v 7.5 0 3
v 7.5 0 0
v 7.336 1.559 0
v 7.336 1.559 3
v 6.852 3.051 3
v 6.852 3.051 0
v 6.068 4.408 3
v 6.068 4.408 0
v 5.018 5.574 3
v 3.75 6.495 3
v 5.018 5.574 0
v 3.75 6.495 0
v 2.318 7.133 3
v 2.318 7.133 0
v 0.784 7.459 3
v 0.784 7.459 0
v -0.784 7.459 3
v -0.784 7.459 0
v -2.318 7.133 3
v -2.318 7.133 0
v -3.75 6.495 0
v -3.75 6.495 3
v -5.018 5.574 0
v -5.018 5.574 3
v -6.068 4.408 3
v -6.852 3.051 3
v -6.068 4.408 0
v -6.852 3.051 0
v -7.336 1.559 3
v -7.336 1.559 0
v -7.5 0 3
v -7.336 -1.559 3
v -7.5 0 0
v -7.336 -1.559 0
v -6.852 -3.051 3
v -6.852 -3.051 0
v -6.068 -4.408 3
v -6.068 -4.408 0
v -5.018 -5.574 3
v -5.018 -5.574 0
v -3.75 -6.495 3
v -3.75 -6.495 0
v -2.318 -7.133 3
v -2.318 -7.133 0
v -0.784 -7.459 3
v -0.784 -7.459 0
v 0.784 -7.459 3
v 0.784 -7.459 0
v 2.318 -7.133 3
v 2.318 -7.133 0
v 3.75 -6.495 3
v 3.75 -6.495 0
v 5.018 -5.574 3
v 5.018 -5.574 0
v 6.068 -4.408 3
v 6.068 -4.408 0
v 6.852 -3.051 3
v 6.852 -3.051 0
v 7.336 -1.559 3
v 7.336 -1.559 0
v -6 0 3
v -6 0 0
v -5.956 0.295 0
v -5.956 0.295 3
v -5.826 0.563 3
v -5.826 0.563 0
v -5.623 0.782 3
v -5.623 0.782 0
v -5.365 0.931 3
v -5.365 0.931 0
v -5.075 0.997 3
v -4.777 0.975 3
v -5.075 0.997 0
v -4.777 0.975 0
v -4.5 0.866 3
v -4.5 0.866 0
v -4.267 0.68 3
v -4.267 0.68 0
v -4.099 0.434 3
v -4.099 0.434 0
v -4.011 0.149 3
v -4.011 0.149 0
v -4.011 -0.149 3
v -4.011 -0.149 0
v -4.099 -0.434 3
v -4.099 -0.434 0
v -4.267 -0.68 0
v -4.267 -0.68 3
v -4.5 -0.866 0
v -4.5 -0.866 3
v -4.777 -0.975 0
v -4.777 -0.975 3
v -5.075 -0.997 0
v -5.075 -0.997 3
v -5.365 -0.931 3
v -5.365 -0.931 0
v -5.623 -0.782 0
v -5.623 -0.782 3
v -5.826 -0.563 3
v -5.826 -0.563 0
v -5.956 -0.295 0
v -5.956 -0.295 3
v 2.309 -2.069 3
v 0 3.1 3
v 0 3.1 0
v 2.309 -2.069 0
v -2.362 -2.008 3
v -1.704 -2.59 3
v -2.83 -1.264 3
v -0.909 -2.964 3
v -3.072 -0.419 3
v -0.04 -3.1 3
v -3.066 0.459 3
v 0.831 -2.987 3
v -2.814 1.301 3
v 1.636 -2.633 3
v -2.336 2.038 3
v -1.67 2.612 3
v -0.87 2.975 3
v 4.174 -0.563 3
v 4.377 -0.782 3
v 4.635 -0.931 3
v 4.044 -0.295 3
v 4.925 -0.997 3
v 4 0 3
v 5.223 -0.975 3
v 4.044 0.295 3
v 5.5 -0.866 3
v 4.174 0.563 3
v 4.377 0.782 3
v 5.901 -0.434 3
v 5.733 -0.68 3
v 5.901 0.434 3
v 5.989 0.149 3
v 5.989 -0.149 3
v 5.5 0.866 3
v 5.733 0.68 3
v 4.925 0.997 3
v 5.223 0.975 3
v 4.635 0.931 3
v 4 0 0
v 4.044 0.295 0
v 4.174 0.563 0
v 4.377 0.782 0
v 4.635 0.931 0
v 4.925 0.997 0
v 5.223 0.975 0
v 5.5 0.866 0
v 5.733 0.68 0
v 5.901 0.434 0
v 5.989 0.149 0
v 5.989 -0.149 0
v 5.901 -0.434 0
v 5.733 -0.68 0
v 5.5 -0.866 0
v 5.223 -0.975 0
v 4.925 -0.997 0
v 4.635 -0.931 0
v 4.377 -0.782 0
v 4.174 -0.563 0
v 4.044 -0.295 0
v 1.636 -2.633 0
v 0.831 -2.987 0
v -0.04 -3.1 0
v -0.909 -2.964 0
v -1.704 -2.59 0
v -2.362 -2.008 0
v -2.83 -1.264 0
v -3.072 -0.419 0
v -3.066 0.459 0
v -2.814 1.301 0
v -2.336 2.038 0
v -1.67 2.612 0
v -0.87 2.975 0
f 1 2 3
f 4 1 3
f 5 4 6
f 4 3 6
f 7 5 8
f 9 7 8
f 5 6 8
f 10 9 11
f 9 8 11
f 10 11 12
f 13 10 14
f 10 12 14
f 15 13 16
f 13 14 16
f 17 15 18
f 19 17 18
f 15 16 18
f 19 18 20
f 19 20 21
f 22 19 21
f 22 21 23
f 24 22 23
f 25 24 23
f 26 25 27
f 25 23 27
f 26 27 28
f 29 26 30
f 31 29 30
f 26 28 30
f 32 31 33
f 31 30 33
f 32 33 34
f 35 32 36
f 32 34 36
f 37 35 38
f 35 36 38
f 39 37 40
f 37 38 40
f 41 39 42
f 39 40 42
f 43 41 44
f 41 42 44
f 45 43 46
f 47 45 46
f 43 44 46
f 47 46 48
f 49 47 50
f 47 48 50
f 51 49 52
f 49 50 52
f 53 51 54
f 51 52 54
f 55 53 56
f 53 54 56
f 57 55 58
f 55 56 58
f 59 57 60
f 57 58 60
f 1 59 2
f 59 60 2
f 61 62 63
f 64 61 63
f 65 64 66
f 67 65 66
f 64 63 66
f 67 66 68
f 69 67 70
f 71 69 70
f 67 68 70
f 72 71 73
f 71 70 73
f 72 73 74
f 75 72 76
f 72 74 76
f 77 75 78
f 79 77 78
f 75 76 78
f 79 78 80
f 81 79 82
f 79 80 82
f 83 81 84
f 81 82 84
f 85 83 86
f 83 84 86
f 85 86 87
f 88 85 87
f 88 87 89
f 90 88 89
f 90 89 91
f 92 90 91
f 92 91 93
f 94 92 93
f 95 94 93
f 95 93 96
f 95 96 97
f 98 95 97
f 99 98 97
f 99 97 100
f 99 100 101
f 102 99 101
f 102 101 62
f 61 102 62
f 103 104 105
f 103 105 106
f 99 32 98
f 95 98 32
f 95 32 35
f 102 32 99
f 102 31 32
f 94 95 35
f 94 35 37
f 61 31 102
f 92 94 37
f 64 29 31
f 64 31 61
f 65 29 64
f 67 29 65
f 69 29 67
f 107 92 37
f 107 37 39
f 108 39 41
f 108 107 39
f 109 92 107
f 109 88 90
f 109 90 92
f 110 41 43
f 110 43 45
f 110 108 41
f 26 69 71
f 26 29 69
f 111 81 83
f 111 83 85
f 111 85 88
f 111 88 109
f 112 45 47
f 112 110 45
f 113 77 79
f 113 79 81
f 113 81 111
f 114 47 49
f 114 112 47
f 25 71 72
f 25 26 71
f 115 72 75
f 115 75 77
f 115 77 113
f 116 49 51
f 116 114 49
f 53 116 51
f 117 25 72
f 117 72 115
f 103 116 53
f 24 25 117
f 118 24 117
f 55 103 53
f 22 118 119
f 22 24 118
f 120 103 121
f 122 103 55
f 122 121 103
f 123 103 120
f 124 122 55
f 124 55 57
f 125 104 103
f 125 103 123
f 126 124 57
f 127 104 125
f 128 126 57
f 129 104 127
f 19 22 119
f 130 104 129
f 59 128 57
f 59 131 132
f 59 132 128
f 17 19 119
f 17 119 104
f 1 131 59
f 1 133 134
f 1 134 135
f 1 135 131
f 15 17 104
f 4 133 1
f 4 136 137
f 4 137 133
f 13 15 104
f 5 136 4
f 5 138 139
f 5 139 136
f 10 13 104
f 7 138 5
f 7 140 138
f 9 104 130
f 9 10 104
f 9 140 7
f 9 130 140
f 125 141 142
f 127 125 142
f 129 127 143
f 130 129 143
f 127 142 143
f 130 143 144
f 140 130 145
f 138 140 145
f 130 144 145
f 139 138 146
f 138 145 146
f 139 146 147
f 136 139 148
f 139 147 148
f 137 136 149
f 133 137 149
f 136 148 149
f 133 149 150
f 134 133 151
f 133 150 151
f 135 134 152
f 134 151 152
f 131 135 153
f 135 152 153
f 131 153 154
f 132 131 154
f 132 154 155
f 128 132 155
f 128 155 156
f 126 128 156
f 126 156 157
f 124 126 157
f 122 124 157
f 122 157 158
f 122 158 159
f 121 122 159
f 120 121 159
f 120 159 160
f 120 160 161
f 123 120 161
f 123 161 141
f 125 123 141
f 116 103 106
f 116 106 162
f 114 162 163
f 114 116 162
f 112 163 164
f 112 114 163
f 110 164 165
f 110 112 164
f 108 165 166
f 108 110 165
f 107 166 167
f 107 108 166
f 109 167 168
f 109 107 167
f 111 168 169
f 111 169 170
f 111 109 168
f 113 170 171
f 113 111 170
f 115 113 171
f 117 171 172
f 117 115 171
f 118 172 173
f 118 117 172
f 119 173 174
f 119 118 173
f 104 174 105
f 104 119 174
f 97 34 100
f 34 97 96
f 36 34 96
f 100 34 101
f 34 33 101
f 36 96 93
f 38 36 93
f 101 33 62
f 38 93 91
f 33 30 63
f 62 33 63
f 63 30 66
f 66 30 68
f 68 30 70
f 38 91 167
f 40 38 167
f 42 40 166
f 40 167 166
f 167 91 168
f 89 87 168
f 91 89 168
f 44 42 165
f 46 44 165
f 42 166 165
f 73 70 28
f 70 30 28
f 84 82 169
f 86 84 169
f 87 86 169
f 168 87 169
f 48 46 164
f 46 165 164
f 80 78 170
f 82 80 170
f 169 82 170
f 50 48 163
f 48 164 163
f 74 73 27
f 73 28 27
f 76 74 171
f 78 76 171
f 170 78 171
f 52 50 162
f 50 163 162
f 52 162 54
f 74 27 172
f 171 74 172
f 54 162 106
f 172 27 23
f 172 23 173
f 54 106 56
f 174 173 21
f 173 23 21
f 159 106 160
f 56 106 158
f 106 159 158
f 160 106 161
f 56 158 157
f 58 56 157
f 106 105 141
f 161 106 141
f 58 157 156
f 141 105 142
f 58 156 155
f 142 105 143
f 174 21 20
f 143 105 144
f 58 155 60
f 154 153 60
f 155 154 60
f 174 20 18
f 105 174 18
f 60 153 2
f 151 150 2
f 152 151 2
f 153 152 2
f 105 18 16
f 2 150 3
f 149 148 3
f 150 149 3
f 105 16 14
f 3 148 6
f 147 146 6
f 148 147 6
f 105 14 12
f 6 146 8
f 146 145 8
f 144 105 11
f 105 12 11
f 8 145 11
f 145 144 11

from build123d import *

# Parameters (mm, degrees)
SKETCH1_R             = 7.5
BOSS_EXTRUDE1_DEPTH   = 3
CUT_EXTRUDE1_DEPTH    = 3
F_2_0MM_DOWEL_HOLE1_D = 2


with BuildPart() as part:
    # Sketch1 → Boss-Extrude1 (new body)
    with BuildSketch(Plane.XY):
        Circle(SKETCH1_R)
    extrude(amount=BOSS_EXTRUDE1_DEPTH)

    # Sketch2 → Cut-Extrude1 (cut)
    with BuildSketch(Plane.XY.offset(3)):
        with BuildLine():
            Line((0, 3.1), (2.308854941, -2.068620038))
            ThreePointArc((2.308854941, -2.068620038), (-2.830434783, -1.264372944), (0, 3.1))
        make_face()
    extrude(amount=-CUT_EXTRUDE1_DEPTH, mode=Mode.SUBTRACT)

    # Ø2.0mm Dowel Hole1 (through all)
    with Locations(Plane.XY.offset(3)):
        with Locations((-5, 0), (5, 0)):
            Hole(F_2_0MM_DOWEL_HOLE1_D / 2)


solid = part.part
